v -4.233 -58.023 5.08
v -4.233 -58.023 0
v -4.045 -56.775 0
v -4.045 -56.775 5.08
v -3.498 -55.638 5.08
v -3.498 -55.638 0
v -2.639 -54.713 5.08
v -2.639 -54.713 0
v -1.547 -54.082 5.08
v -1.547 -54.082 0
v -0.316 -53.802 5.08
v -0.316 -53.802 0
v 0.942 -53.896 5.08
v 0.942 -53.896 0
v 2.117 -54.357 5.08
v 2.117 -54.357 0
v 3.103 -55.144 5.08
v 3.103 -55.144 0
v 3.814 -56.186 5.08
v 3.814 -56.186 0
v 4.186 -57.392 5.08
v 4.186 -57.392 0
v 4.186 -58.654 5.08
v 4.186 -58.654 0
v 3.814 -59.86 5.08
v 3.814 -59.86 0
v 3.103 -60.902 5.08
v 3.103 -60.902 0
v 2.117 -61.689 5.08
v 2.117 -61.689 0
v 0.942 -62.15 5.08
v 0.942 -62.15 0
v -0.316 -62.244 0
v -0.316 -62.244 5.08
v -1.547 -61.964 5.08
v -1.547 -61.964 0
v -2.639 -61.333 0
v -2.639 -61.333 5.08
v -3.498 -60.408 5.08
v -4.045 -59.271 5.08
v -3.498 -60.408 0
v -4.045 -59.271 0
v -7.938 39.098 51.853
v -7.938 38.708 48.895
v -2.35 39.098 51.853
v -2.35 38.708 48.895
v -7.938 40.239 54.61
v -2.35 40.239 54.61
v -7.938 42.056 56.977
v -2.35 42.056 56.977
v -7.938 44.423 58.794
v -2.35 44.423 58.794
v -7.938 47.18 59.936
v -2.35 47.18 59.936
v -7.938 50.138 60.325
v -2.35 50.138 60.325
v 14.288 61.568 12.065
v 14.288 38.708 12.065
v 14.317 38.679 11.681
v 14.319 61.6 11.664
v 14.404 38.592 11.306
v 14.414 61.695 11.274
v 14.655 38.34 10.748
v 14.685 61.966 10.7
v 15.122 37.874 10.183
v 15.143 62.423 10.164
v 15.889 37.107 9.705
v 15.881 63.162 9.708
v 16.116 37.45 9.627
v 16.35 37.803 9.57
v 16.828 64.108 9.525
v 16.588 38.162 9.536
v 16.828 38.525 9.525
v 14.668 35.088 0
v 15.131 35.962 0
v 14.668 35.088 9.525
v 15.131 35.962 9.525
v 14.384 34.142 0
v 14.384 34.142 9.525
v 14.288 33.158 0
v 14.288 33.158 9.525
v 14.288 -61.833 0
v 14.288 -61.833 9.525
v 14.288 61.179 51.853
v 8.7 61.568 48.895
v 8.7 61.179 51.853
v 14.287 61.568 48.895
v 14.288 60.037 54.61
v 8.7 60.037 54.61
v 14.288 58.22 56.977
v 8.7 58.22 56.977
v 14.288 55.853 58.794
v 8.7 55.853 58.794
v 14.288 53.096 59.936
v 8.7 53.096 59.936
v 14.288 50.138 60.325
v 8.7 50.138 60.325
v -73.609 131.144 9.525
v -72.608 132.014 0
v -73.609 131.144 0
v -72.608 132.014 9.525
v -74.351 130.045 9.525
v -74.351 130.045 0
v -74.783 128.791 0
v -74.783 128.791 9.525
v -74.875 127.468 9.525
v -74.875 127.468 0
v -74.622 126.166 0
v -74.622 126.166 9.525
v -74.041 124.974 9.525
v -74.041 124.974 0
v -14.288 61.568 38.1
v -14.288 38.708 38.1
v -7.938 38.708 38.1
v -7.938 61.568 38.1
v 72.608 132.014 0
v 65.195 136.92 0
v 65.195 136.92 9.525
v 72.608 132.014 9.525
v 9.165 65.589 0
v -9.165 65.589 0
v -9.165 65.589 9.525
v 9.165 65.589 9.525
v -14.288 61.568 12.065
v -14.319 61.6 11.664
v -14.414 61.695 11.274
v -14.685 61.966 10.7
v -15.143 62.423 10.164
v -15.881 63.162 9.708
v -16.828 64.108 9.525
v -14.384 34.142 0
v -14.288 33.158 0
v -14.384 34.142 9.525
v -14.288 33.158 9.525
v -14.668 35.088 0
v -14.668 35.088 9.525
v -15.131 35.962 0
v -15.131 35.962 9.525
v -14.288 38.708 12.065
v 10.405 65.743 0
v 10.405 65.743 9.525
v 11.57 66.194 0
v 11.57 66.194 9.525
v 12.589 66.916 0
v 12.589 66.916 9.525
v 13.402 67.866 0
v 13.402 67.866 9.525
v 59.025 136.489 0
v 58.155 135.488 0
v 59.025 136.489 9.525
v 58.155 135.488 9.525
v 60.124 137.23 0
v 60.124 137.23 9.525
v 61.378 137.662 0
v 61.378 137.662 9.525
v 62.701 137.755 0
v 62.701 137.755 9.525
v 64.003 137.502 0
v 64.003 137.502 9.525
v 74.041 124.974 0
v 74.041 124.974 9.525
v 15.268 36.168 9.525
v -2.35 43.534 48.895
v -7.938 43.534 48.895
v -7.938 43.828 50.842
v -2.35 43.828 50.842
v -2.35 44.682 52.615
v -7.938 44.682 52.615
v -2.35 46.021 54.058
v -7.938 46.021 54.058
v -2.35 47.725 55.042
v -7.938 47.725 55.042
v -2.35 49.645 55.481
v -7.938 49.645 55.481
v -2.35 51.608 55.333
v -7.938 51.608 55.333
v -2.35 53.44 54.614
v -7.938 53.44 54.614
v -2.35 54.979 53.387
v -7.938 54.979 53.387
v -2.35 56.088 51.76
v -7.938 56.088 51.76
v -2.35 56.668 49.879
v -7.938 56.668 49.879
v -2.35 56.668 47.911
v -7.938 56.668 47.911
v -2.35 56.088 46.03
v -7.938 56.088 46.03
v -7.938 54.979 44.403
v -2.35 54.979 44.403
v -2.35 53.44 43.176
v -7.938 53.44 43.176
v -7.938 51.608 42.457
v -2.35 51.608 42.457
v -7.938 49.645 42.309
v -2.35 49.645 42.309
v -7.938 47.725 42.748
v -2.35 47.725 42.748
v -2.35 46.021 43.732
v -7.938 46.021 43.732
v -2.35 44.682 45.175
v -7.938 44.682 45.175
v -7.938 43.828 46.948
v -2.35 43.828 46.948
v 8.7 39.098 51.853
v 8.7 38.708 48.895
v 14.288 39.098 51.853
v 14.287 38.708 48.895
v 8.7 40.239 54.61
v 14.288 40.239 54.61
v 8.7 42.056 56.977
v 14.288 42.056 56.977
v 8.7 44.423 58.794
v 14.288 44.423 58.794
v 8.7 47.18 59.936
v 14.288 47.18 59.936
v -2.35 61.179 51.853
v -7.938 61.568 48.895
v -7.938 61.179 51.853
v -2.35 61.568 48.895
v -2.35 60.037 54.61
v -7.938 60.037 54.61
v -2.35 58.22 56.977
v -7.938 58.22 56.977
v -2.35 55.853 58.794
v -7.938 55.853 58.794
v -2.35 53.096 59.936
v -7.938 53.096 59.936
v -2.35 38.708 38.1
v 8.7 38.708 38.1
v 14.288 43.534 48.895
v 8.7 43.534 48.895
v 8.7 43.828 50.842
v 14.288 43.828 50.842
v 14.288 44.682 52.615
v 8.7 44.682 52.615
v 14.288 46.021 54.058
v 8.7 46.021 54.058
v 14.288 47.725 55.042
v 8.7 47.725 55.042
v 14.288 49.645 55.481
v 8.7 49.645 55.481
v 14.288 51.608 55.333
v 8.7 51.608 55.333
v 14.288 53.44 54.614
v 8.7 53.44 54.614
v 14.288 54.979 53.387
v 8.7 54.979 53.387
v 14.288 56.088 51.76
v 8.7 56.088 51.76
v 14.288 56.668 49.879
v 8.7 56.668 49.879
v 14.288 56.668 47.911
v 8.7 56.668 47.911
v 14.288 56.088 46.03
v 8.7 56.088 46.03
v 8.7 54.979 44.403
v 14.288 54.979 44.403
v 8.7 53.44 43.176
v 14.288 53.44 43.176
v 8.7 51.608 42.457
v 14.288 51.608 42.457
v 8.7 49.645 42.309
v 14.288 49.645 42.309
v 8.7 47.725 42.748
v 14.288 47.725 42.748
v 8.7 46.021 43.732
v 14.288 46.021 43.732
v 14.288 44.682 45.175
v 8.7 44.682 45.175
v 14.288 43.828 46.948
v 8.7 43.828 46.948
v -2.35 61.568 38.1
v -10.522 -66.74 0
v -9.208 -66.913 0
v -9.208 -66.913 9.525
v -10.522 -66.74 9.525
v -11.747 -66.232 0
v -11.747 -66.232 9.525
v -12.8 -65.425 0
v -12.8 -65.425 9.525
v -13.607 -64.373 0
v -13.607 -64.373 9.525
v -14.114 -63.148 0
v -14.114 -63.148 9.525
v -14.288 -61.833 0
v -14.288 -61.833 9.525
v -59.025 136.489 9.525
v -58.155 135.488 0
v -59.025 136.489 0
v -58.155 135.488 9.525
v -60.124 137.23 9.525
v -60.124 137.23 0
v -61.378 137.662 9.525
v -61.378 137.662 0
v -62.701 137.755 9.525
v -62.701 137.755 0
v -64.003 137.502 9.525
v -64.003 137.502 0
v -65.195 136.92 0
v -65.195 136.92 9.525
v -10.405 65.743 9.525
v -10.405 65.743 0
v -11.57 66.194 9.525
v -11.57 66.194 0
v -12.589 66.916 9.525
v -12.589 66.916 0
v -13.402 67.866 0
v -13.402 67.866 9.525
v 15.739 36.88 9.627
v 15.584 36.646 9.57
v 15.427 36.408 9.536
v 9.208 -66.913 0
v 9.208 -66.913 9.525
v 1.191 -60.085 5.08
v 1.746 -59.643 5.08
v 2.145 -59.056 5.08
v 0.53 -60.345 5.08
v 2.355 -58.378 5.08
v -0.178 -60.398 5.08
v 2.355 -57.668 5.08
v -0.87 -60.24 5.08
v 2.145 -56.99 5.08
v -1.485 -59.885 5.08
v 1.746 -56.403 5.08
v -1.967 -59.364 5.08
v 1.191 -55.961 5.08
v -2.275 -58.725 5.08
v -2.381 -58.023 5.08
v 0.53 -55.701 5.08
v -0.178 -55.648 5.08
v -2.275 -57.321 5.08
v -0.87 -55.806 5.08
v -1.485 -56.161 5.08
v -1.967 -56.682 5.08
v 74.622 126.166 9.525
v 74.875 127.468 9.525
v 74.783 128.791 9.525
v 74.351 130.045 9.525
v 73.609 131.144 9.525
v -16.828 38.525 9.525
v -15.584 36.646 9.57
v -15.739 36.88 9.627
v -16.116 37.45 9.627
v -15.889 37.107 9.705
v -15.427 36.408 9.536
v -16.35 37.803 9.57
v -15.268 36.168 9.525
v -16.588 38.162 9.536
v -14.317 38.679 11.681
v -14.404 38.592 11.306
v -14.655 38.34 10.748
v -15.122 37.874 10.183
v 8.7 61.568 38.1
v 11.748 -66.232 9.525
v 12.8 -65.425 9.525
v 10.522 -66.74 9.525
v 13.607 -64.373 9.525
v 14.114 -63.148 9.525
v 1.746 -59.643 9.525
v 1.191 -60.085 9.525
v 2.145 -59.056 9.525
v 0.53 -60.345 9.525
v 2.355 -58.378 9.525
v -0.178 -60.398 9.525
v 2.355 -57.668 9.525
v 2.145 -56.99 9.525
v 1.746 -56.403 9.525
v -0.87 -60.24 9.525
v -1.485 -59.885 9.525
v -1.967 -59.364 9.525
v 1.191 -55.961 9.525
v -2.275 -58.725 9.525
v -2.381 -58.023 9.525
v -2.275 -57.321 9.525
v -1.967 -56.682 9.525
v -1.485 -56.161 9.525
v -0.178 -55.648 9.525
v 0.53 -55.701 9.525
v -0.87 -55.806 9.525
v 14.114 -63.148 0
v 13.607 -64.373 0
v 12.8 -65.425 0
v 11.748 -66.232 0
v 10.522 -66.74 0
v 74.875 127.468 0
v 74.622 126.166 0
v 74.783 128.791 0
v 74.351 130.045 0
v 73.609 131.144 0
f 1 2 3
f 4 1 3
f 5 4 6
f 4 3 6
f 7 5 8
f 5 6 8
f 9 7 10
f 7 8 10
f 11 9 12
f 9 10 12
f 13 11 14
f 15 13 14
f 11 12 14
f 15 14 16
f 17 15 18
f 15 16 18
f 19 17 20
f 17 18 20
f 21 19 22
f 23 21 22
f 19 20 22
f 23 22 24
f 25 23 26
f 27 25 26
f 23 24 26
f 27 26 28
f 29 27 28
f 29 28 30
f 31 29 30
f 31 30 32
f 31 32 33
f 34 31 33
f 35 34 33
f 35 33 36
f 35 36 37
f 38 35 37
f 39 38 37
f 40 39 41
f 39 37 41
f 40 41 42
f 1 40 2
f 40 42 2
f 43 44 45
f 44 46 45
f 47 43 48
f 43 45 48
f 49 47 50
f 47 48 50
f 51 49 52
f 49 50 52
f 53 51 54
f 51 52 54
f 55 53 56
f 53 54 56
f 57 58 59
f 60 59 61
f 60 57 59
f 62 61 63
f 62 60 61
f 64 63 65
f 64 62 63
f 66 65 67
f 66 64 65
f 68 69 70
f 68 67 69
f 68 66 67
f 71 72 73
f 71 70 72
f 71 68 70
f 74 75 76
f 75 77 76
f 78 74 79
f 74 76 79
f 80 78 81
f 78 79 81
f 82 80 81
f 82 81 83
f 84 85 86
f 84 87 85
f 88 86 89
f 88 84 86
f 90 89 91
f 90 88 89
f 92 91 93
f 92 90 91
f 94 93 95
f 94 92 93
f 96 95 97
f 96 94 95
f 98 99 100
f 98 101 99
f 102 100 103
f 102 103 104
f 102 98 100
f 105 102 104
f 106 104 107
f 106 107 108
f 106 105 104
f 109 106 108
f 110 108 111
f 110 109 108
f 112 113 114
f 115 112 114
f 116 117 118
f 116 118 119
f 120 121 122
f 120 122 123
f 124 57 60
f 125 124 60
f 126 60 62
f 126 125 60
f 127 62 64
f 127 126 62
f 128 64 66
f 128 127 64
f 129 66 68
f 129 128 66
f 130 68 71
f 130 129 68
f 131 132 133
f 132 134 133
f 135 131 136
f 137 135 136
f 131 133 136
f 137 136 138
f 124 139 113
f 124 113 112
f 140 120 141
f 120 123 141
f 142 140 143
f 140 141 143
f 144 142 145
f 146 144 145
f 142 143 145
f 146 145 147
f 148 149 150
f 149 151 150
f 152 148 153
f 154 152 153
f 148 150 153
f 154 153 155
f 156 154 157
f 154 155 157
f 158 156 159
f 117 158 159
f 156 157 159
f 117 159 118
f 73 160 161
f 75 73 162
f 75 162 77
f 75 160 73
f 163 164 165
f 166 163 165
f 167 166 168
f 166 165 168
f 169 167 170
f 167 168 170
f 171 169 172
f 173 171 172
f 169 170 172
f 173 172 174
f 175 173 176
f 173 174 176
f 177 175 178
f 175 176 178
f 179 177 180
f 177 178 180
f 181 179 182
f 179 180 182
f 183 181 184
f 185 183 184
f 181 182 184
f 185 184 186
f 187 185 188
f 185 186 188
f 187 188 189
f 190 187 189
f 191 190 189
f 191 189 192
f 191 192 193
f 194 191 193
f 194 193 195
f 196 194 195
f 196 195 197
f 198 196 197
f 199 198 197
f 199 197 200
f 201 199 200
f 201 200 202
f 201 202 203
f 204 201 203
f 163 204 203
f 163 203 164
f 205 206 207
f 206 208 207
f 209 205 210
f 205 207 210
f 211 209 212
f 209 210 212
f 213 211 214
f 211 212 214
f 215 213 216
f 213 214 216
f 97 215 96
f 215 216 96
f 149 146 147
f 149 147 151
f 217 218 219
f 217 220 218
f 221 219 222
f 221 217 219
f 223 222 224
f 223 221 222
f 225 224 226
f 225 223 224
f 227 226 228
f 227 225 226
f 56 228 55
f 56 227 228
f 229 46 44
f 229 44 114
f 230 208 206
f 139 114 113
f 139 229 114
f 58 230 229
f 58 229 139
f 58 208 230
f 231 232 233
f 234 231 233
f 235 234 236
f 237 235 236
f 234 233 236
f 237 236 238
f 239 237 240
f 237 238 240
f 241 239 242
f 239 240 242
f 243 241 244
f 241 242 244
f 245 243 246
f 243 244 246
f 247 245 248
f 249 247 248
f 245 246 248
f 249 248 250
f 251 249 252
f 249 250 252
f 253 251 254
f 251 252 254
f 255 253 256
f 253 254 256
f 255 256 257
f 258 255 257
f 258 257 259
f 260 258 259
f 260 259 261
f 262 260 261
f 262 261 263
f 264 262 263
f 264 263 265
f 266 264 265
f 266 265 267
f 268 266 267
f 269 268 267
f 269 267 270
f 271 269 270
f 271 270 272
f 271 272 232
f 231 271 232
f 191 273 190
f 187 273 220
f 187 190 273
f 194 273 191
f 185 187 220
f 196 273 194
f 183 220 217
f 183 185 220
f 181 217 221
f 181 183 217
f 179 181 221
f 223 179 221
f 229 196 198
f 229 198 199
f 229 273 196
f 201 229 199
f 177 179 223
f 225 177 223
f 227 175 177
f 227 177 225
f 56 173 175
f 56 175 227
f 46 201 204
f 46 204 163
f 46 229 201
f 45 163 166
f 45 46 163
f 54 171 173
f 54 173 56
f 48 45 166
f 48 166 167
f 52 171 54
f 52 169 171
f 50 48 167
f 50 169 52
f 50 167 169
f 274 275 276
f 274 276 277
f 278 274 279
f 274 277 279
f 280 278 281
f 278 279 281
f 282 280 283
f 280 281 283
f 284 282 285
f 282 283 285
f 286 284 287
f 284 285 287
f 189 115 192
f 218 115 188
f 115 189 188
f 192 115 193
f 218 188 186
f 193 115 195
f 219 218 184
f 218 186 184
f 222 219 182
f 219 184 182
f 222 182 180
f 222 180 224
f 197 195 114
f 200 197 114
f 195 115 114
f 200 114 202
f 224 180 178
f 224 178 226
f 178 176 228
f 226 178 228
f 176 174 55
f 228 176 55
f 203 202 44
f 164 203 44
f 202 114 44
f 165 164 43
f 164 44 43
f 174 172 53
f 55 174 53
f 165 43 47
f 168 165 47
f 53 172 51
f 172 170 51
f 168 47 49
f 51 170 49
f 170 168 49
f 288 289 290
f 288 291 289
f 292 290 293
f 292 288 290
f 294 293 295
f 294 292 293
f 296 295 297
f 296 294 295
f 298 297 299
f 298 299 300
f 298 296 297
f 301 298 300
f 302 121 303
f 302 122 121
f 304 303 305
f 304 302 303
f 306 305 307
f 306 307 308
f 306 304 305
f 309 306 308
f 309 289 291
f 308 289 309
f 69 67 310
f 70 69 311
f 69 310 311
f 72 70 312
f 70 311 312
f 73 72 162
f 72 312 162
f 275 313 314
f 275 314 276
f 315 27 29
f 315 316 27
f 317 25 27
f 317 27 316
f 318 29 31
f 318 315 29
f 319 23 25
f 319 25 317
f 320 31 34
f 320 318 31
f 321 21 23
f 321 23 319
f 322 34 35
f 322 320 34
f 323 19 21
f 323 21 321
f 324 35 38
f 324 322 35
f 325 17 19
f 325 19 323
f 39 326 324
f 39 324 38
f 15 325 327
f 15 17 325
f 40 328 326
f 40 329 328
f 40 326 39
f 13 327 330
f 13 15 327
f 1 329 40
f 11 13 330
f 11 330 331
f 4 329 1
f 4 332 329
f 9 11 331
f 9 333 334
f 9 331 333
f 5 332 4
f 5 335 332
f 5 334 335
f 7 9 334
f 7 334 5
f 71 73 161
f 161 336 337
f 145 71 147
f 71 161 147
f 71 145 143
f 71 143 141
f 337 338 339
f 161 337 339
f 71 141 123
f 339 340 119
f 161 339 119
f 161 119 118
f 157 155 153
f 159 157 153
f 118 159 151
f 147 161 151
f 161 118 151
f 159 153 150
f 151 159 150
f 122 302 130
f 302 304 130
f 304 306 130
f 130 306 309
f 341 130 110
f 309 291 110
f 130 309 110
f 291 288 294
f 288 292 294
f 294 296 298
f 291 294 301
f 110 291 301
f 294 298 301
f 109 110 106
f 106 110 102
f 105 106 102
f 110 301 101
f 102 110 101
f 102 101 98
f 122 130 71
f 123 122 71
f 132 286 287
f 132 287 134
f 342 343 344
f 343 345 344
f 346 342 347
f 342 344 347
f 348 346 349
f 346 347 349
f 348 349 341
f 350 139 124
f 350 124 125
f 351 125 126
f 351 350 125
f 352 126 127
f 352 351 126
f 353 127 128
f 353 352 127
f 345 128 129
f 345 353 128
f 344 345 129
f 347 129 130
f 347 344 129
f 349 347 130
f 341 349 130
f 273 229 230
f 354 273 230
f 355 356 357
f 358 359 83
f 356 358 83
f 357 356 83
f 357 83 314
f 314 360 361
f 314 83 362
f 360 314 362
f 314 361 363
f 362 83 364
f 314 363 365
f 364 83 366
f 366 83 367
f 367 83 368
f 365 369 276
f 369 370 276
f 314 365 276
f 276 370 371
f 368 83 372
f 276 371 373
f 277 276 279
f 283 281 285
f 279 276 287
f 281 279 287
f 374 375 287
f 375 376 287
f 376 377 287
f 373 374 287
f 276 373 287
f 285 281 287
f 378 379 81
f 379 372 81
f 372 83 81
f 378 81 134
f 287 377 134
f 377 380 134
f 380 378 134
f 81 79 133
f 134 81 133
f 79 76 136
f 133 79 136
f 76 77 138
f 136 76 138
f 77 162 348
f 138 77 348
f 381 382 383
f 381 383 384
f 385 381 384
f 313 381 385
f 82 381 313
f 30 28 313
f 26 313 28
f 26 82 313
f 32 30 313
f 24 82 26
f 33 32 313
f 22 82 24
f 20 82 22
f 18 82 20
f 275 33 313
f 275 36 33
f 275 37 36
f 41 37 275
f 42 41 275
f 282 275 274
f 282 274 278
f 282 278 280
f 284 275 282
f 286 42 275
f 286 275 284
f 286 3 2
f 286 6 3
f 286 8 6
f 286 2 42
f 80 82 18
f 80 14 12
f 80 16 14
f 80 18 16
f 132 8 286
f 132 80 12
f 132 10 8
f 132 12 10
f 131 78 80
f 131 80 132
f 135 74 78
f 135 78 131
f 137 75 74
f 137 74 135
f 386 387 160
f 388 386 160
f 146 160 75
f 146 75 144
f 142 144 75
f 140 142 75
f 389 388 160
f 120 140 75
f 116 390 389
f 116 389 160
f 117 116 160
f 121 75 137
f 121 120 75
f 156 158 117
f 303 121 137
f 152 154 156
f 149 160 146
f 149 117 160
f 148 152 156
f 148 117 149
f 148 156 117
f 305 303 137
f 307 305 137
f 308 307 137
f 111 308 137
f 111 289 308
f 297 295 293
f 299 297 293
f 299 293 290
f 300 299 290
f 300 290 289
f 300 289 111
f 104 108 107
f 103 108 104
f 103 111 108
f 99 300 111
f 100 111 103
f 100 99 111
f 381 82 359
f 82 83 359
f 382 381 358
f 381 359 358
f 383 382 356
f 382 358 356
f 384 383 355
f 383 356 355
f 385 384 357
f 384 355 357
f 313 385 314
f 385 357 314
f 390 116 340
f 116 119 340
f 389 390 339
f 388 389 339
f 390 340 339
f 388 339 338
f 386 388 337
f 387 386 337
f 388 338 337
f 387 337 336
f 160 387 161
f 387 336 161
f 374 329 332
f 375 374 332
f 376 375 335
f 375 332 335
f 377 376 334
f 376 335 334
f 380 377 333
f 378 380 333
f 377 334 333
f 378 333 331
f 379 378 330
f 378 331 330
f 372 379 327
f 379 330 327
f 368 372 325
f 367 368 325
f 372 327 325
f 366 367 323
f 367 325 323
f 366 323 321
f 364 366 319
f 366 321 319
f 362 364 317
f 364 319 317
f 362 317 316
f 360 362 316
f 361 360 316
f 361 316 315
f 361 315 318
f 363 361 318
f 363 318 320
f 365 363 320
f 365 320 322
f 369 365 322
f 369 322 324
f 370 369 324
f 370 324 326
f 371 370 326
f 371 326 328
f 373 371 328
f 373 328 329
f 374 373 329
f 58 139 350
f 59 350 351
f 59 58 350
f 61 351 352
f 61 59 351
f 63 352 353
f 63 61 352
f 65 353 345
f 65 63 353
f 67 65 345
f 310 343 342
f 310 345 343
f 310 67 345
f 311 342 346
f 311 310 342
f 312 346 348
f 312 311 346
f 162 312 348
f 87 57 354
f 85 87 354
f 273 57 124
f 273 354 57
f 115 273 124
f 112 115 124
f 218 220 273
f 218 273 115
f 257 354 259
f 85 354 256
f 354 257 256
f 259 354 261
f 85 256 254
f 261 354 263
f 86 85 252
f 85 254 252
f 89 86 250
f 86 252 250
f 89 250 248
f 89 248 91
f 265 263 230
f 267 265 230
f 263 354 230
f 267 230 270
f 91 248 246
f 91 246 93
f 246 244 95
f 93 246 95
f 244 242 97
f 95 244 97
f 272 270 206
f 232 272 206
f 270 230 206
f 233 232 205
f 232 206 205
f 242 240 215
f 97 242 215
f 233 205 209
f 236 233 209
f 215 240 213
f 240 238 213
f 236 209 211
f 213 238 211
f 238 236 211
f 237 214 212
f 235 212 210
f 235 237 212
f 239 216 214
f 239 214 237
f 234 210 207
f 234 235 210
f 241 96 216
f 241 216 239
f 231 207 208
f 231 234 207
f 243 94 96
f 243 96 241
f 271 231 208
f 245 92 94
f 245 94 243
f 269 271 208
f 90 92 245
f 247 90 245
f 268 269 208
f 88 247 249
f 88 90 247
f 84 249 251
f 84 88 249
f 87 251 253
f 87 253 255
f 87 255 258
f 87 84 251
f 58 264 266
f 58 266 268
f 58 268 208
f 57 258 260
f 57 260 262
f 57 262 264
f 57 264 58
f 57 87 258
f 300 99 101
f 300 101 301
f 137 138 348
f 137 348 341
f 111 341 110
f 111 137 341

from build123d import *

# Parameters (mm, degrees)
BOSS_EXTRUDE1_DEPTH = 9.525
SKETCH3_W           = 28.575
SKETCH3_H           = 22.86
BOSS_EXTRUDE2_DEPTH = 50.8
FILLET1_R           = 5.08
SKETCH4_W           = 6.35
SKETCH4_H           = 22.225
SKETCH4_W_2         = 11.049
CUT_EXTRUDE1_DEPTH  = 143.837889922
FILLET3_R           = 11.43
SKETCH5_R           = 6.604
CUT_EXTRUDE2_DEPTH  = 172.690359797
SKETCH7_R           = 4.233333333
CUT_EXTRUDE3_DEPTH  = 5.08
SKETCH8_R           = 2.38125
CUT_EXTRUDE4_DEPTH  = 167.248859845
FILLET7_R           = 2.54


# Some blends are built 0.0001 mm under size
with BuildPart() as part:
    # Sketch1 → Boss-Extrude1 (new body)
    with BuildSketch(Plane.XY):
        Polygon((-11.895004803, 65.589219752), (11.895004803, 65.589219752), (60.958729286, 139.723968283), (76.844746829, 129.210313037), (14.2875, 34.687000521), (14.2875, -66.912999479), (-14.2875, -66.912999479), (-14.2875, 34.687000521), (-76.844746829, 129.210313037), (-60.958729286, 139.723968283), align=None)
    extrude(amount=BOSS_EXTRUDE1_DEPTH)

    # Sketch3 → Boss-Extrude2 (add)
    with BuildSketch(Plane.XY.offset(9.525)):
        with Locations((0, 50.138110136)):
            Rectangle(SKETCH3_W, SKETCH3_H)
    extrude(amount=BOSS_EXTRUDE2_DEPTH)

    # Fillet1
    fillet1_edges = [part.edges().sort_by_distance(p)[0] for p in [
        (-11.895004803, 65.589219752, 4.7625),
        (11.895004803, 65.589219752, 4.7625),
        (60.958729286, 139.723968283, 4.7625),
        (76.844746829, 129.210313037, 4.7625),
        (14.2875, 34.687000521, 4.7625),
        (14.2875, -66.912999479, 4.7625),
        (-14.2875, -66.912999479, 4.7625),
        (-14.2875, 34.687000521, 4.7625),
        (-76.844746829, 129.210313037, 4.7625),
        (-60.958729286, 139.723968283, 4.7625),
    ]]
    fillet(fillet1_edges, radius=FILLET1_R)

    # Sketch4 → Cut-Extrude1 (cut, through all)
    with BuildSketch(Plane.XZ.offset(-38.708110136)):
        with Locations((-11.1125, 49.2125)):
            Rectangle(SKETCH4_W, SKETCH4_H)
        with Locations((3.175, 49.2125)):
            Rectangle(SKETCH4_W_2, SKETCH4_H)
    extrude(amount=-CUT_EXTRUDE1_DEPTH, mode=Mode.SUBTRACT)

    # Fillet3
    fillet3_edges = [part.edges().sort_by_distance(p)[0] for p in [
        (11.4935, 61.568110136, 60.325),
        (-5.1435, 61.568110136, 60.325),
        (11.4935, 38.708110136, 60.325),
        (-5.1435, 38.708110136, 60.325),
    ]]
    fillet(fillet3_edges, radius=FILLET3_R - 0.0001)  # a hair under: the kernel refuses the full size

    # Sketch5 → Cut-Extrude2 (cut, through all)
    with BuildSketch(Plane.ZY.offset(7.9375)):
        with Locations(Location((48.895, 50.138110136, 0), (0, 0, 270))):
            Circle(SKETCH5_R)
    extrude(amount=-CUT_EXTRUDE2_DEPTH, mode=Mode.SUBTRACT)

    # Sketch7 → Cut-Extrude3 (cut)
    with BuildSketch(Plane(origin=(0, 0, 0), x_dir=(-1, 0, 0), z_dir=(0, 0, -1))):
        with Locations((0, -58.022999479)):
            Circle(SKETCH7_R)
    extrude(amount=-CUT_EXTRUDE3_DEPTH, mode=Mode.SUBTRACT)

    # Sketch8 → Cut-Extrude4 (cut, through all)
    with BuildSketch(Plane(origin=(0, 0, 5.08), x_dir=(-1, 0, 0), z_dir=(0, 0, -1))):
        with Locations((0, -58.022999479)):
            Circle(SKETCH8_R)
    extrude(amount=-CUT_EXTRUDE4_DEPTH, mode=Mode.SUBTRACT)

    # Fillet7
    # the kernel refuses this fillet: 2.54 mm, written as the material it adds along each edge
    with BuildSketch(Plane(origin=(-14.2875, 38.708110136, 9.525), x_dir=(0, 0, 1), z_dir=(0, 1, 0))) as fillet7_piece_1:
        with BuildLine():
            CenterArc((FILLET7_R, -FILLET7_R), FILLET7_R, 90, 90)
            Line((0, -FILLET7_R), (0, 0))
            Line((0, 0), (FILLET7_R, 0))
        make_face()
    extrude(amount=22.86)
    with BuildSketch(Plane(origin=(14.2875, 38.708110136, 9.525), x_dir=(0, 0, 1), z_dir=(-1, 0, 0))) as fillet7_piece_2:
        with BuildLine():
            CenterArc((FILLET7_R, -FILLET7_R), FILLET7_R, 90, 90)
            Line((0, -FILLET7_R), (0, 0))
            Line((0, 0), (FILLET7_R, 0))
        make_face()
    extrude(amount=28.575)
    with BuildSketch(Plane(origin=(14.2875, 61.568110136, 9.525), x_dir=(1, 0, 0), z_dir=(0, -1, 0))) as fillet7_piece_3:
        with BuildLine():
            CenterArc((FILLET7_R, FILLET7_R), FILLET7_R, 180, 90)
            Line((0, FILLET7_R), (0, 0))
            Line((0, 0), (FILLET7_R, 0))
        make_face()
    extrude(amount=22.86)
    with BuildSketch(Plane(origin=(-14.2875, 61.568110136, 9.525), x_dir=(0, 1, 0), z_dir=(1, 0, 0))) as fillet7_piece_4:
        with BuildLine():
            CenterArc((FILLET7_R, FILLET7_R), FILLET7_R, 180, 90)
            Line((0, FILLET7_R), (0, 0))
            Line((0, 0), (FILLET7_R, 0))
        make_face()
    extrude(amount=28.575)
    with BuildSketch(Plane(origin=(14.2875, 38.708110136, 9.525), x_dir=(0, 0, 1), z_dir=(-1, 0, 0))) as fillet7_piece_5a_section:
        with BuildLine():
            CenterArc((FILLET7_R, -FILLET7_R), FILLET7_R, 90, 90)
            Line((0, -FILLET7_R), (0, 0))
            Line((0, 0), (FILLET7_R, 0))
        make_face()
    fillet7_piece_5a = extrude(amount=34.925, mode=Mode.PRIVATE)
    fillet7_piece_5a = split(fillet7_piece_5a, bisect_by=Plane(origin=(-14.2875, 38.220078421, 10.151447049), z_dir=(-1, 0, 0)), keep=Keep.TOP, mode=Mode.PRIVATE)
    fillet7_piece_5a = split(fillet7_piece_5a, bisect_by=Plane(origin=(-16.26964909, 37.682006014, 10.151447049), z_dir=(0.8339116820223069, 0.5518979131929445, 0)), keep=Keep.TOP, mode=Mode.PRIVATE)
    with BuildSketch(Plane(origin=(-14.2875, 32.358110136, 9.525), x_dir=(0, 0, 1), z_dir=(0, 1, 0))) as fillet7_piece_5b_section:
        with BuildLine():
            CenterArc((FILLET7_R, -FILLET7_R), FILLET7_R, 90, 90)
            Line((0, -FILLET7_R), (0, 0))
            Line((0, 0), (FILLET7_R, 0))
        make_face()
    fillet7_piece_5b = extrude(amount=29.21, mode=Mode.PRIVATE)
    fillet7_piece_5b = split(fillet7_piece_5b, bisect_by=Plane(origin=(-14.718813993, 38.708110136, 10.184953821), z_dir=(0, -1, 0)), keep=Keep.TOP, mode=Mode.PRIVATE)
    fillet7_piece_5b = split(fillet7_piece_5b, bisect_by=Plane(origin=(-15.49417016, 36.510265873, 10.184953821), z_dir=(0.8339116820223069, 0.5518979131929445, 0)), keep=Keep.TOP, mode=Mode.PRIVATE)
    fillet7_piece_5 = fillet7_piece_5a & fillet7_piece_5b
    add(fillet7_piece_5)
    with BuildSketch(Plane(origin=(-14.2875, 38.708110136, 9.525), x_dir=(0, 0, 1), z_dir=(0, 1, 0))) as fillet7_piece_6a_section:
        with BuildLine():
            CenterArc((FILLET7_R, -FILLET7_R), FILLET7_R, 90, 90)
            Line((0, -FILLET7_R), (0, 0))
            Line((0, 0), (FILLET7_R, 0))
        make_face()
    fillet7_piece_6a = extrude(amount=29.21, mode=Mode.PRIVATE)
    fillet7_piece_6a = split(fillet7_piece_6a, bisect_by=Plane(origin=(-14.86254359, 61.568110136, 10.10004359), z_dir=(0, 1, 0)), keep=Keep.TOP, mode=Mode.PRIVATE)
    with BuildSketch(Plane(origin=(-20.6375, 61.568110136, 9.525), x_dir=(0, 1, 0), z_dir=(1, 0, 0))) as fillet7_piece_6b_section:
        with BuildLine():
            CenterArc((FILLET7_R, FILLET7_R), FILLET7_R, 180, 90)
            Line((0, FILLET7_R), (0, 0))
            Line((0, 0), (FILLET7_R, 0))
        make_face()
    fillet7_piece_6b = extrude(amount=34.925, mode=Mode.PRIVATE)
    fillet7_piece_6b = split(fillet7_piece_6b, bisect_by=Plane(origin=(-14.2875, 62.143153727, 10.10004359), z_dir=(-1, 0, 0)), keep=Keep.TOP, mode=Mode.PRIVATE)
    fillet7_piece_6 = fillet7_piece_6a & fillet7_piece_6b
    add(fillet7_piece_6)
    with BuildSketch(Plane(origin=(20.6375, 38.708110136, 9.525), x_dir=(0, 0, 1), z_dir=(-1, 0, 0))) as fillet7_piece_7a_section:
        with BuildLine():
            CenterArc((FILLET7_R, -FILLET7_R), FILLET7_R, 90, 90)
            Line((0, -FILLET7_R), (0, 0))
            Line((0, 0), (FILLET7_R, 0))
        make_face()
    fillet7_piece_7a = extrude(amount=34.925, mode=Mode.PRIVATE)
    fillet7_piece_7a = split(fillet7_piece_7a, bisect_by=Plane(origin=(14.2875, 38.220078421, 10.151447049), z_dir=(1, 0, 0)), keep=Keep.TOP, mode=Mode.PRIVATE)
    fillet7_piece_7a = split(fillet7_piece_7a, bisect_by=Plane(origin=(16.26964909, 37.682006014, 10.151447049), z_dir=(-0.8339116820223068, 0.5518979131929448, 0)), keep=Keep.TOP, mode=Mode.PRIVATE)
    with BuildSketch(Plane(origin=(14.2875, 61.568110136, 9.525), x_dir=(1, 0, 0), z_dir=(0, -1, 0))) as fillet7_piece_7b_section:
        with BuildLine():
            CenterArc((FILLET7_R, FILLET7_R), FILLET7_R, 180, 90)
            Line((0, FILLET7_R), (0, 0))
            Line((0, 0), (FILLET7_R, 0))
        make_face()
    fillet7_piece_7b = extrude(amount=29.21, mode=Mode.PRIVATE)
    fillet7_piece_7b = split(fillet7_piece_7b, bisect_by=Plane(origin=(14.718813993, 38.708110136, 10.184953821), z_dir=(0, -1, 0)), keep=Keep.TOP, mode=Mode.PRIVATE)
    fillet7_piece_7b = split(fillet7_piece_7b, bisect_by=Plane(origin=(15.49417016, 36.510265872, 10.184953821), z_dir=(-0.8339116820223068, 0.5518979131929448, 0)), keep=Keep.TOP, mode=Mode.PRIVATE)
    fillet7_piece_7 = fillet7_piece_7a & fillet7_piece_7b
    add(fillet7_piece_7)
    with BuildSketch(Plane(origin=(14.2875, 67.918110136, 9.525), x_dir=(1, 0, 0), z_dir=(0, -1, 0))) as fillet7_piece_8a_section:
        with BuildLine():
            CenterArc((FILLET7_R, FILLET7_R), FILLET7_R, 180, 90)
            Line((0, FILLET7_R), (0, 0))
            Line((0, 0), (FILLET7_R, 0))
        make_face()
    fillet7_piece_8a = extrude(amount=29.21, mode=Mode.PRIVATE)
    fillet7_piece_8a = split(fillet7_piece_8a, bisect_by=Plane(origin=(14.86254359, 61.568110136, 10.10004359), z_dir=(0, 1, 0)), keep=Keep.TOP, mode=Mode.PRIVATE)
    with BuildSketch(Plane(origin=(-14.2875, 61.568110136, 9.525), x_dir=(0, 1, 0), z_dir=(1, 0, 0))) as fillet7_piece_8b_section:
        with BuildLine():
            CenterArc((FILLET7_R, FILLET7_R), FILLET7_R, 180, 90)
            Line((0, FILLET7_R), (0, 0))
            Line((0, 0), (FILLET7_R, 0))
        make_face()
    fillet7_piece_8b = extrude(amount=34.925, mode=Mode.PRIVATE)
    fillet7_piece_8b = split(fillet7_piece_8b, bisect_by=Plane(origin=(14.2875, 62.143153727, 10.10004359), z_dir=(1, 0, 0)), keep=Keep.TOP, mode=Mode.PRIVATE)
    fillet7_piece_8 = fillet7_piece_8a & fillet7_piece_8b
    add(fillet7_piece_8)


solid = part.part
